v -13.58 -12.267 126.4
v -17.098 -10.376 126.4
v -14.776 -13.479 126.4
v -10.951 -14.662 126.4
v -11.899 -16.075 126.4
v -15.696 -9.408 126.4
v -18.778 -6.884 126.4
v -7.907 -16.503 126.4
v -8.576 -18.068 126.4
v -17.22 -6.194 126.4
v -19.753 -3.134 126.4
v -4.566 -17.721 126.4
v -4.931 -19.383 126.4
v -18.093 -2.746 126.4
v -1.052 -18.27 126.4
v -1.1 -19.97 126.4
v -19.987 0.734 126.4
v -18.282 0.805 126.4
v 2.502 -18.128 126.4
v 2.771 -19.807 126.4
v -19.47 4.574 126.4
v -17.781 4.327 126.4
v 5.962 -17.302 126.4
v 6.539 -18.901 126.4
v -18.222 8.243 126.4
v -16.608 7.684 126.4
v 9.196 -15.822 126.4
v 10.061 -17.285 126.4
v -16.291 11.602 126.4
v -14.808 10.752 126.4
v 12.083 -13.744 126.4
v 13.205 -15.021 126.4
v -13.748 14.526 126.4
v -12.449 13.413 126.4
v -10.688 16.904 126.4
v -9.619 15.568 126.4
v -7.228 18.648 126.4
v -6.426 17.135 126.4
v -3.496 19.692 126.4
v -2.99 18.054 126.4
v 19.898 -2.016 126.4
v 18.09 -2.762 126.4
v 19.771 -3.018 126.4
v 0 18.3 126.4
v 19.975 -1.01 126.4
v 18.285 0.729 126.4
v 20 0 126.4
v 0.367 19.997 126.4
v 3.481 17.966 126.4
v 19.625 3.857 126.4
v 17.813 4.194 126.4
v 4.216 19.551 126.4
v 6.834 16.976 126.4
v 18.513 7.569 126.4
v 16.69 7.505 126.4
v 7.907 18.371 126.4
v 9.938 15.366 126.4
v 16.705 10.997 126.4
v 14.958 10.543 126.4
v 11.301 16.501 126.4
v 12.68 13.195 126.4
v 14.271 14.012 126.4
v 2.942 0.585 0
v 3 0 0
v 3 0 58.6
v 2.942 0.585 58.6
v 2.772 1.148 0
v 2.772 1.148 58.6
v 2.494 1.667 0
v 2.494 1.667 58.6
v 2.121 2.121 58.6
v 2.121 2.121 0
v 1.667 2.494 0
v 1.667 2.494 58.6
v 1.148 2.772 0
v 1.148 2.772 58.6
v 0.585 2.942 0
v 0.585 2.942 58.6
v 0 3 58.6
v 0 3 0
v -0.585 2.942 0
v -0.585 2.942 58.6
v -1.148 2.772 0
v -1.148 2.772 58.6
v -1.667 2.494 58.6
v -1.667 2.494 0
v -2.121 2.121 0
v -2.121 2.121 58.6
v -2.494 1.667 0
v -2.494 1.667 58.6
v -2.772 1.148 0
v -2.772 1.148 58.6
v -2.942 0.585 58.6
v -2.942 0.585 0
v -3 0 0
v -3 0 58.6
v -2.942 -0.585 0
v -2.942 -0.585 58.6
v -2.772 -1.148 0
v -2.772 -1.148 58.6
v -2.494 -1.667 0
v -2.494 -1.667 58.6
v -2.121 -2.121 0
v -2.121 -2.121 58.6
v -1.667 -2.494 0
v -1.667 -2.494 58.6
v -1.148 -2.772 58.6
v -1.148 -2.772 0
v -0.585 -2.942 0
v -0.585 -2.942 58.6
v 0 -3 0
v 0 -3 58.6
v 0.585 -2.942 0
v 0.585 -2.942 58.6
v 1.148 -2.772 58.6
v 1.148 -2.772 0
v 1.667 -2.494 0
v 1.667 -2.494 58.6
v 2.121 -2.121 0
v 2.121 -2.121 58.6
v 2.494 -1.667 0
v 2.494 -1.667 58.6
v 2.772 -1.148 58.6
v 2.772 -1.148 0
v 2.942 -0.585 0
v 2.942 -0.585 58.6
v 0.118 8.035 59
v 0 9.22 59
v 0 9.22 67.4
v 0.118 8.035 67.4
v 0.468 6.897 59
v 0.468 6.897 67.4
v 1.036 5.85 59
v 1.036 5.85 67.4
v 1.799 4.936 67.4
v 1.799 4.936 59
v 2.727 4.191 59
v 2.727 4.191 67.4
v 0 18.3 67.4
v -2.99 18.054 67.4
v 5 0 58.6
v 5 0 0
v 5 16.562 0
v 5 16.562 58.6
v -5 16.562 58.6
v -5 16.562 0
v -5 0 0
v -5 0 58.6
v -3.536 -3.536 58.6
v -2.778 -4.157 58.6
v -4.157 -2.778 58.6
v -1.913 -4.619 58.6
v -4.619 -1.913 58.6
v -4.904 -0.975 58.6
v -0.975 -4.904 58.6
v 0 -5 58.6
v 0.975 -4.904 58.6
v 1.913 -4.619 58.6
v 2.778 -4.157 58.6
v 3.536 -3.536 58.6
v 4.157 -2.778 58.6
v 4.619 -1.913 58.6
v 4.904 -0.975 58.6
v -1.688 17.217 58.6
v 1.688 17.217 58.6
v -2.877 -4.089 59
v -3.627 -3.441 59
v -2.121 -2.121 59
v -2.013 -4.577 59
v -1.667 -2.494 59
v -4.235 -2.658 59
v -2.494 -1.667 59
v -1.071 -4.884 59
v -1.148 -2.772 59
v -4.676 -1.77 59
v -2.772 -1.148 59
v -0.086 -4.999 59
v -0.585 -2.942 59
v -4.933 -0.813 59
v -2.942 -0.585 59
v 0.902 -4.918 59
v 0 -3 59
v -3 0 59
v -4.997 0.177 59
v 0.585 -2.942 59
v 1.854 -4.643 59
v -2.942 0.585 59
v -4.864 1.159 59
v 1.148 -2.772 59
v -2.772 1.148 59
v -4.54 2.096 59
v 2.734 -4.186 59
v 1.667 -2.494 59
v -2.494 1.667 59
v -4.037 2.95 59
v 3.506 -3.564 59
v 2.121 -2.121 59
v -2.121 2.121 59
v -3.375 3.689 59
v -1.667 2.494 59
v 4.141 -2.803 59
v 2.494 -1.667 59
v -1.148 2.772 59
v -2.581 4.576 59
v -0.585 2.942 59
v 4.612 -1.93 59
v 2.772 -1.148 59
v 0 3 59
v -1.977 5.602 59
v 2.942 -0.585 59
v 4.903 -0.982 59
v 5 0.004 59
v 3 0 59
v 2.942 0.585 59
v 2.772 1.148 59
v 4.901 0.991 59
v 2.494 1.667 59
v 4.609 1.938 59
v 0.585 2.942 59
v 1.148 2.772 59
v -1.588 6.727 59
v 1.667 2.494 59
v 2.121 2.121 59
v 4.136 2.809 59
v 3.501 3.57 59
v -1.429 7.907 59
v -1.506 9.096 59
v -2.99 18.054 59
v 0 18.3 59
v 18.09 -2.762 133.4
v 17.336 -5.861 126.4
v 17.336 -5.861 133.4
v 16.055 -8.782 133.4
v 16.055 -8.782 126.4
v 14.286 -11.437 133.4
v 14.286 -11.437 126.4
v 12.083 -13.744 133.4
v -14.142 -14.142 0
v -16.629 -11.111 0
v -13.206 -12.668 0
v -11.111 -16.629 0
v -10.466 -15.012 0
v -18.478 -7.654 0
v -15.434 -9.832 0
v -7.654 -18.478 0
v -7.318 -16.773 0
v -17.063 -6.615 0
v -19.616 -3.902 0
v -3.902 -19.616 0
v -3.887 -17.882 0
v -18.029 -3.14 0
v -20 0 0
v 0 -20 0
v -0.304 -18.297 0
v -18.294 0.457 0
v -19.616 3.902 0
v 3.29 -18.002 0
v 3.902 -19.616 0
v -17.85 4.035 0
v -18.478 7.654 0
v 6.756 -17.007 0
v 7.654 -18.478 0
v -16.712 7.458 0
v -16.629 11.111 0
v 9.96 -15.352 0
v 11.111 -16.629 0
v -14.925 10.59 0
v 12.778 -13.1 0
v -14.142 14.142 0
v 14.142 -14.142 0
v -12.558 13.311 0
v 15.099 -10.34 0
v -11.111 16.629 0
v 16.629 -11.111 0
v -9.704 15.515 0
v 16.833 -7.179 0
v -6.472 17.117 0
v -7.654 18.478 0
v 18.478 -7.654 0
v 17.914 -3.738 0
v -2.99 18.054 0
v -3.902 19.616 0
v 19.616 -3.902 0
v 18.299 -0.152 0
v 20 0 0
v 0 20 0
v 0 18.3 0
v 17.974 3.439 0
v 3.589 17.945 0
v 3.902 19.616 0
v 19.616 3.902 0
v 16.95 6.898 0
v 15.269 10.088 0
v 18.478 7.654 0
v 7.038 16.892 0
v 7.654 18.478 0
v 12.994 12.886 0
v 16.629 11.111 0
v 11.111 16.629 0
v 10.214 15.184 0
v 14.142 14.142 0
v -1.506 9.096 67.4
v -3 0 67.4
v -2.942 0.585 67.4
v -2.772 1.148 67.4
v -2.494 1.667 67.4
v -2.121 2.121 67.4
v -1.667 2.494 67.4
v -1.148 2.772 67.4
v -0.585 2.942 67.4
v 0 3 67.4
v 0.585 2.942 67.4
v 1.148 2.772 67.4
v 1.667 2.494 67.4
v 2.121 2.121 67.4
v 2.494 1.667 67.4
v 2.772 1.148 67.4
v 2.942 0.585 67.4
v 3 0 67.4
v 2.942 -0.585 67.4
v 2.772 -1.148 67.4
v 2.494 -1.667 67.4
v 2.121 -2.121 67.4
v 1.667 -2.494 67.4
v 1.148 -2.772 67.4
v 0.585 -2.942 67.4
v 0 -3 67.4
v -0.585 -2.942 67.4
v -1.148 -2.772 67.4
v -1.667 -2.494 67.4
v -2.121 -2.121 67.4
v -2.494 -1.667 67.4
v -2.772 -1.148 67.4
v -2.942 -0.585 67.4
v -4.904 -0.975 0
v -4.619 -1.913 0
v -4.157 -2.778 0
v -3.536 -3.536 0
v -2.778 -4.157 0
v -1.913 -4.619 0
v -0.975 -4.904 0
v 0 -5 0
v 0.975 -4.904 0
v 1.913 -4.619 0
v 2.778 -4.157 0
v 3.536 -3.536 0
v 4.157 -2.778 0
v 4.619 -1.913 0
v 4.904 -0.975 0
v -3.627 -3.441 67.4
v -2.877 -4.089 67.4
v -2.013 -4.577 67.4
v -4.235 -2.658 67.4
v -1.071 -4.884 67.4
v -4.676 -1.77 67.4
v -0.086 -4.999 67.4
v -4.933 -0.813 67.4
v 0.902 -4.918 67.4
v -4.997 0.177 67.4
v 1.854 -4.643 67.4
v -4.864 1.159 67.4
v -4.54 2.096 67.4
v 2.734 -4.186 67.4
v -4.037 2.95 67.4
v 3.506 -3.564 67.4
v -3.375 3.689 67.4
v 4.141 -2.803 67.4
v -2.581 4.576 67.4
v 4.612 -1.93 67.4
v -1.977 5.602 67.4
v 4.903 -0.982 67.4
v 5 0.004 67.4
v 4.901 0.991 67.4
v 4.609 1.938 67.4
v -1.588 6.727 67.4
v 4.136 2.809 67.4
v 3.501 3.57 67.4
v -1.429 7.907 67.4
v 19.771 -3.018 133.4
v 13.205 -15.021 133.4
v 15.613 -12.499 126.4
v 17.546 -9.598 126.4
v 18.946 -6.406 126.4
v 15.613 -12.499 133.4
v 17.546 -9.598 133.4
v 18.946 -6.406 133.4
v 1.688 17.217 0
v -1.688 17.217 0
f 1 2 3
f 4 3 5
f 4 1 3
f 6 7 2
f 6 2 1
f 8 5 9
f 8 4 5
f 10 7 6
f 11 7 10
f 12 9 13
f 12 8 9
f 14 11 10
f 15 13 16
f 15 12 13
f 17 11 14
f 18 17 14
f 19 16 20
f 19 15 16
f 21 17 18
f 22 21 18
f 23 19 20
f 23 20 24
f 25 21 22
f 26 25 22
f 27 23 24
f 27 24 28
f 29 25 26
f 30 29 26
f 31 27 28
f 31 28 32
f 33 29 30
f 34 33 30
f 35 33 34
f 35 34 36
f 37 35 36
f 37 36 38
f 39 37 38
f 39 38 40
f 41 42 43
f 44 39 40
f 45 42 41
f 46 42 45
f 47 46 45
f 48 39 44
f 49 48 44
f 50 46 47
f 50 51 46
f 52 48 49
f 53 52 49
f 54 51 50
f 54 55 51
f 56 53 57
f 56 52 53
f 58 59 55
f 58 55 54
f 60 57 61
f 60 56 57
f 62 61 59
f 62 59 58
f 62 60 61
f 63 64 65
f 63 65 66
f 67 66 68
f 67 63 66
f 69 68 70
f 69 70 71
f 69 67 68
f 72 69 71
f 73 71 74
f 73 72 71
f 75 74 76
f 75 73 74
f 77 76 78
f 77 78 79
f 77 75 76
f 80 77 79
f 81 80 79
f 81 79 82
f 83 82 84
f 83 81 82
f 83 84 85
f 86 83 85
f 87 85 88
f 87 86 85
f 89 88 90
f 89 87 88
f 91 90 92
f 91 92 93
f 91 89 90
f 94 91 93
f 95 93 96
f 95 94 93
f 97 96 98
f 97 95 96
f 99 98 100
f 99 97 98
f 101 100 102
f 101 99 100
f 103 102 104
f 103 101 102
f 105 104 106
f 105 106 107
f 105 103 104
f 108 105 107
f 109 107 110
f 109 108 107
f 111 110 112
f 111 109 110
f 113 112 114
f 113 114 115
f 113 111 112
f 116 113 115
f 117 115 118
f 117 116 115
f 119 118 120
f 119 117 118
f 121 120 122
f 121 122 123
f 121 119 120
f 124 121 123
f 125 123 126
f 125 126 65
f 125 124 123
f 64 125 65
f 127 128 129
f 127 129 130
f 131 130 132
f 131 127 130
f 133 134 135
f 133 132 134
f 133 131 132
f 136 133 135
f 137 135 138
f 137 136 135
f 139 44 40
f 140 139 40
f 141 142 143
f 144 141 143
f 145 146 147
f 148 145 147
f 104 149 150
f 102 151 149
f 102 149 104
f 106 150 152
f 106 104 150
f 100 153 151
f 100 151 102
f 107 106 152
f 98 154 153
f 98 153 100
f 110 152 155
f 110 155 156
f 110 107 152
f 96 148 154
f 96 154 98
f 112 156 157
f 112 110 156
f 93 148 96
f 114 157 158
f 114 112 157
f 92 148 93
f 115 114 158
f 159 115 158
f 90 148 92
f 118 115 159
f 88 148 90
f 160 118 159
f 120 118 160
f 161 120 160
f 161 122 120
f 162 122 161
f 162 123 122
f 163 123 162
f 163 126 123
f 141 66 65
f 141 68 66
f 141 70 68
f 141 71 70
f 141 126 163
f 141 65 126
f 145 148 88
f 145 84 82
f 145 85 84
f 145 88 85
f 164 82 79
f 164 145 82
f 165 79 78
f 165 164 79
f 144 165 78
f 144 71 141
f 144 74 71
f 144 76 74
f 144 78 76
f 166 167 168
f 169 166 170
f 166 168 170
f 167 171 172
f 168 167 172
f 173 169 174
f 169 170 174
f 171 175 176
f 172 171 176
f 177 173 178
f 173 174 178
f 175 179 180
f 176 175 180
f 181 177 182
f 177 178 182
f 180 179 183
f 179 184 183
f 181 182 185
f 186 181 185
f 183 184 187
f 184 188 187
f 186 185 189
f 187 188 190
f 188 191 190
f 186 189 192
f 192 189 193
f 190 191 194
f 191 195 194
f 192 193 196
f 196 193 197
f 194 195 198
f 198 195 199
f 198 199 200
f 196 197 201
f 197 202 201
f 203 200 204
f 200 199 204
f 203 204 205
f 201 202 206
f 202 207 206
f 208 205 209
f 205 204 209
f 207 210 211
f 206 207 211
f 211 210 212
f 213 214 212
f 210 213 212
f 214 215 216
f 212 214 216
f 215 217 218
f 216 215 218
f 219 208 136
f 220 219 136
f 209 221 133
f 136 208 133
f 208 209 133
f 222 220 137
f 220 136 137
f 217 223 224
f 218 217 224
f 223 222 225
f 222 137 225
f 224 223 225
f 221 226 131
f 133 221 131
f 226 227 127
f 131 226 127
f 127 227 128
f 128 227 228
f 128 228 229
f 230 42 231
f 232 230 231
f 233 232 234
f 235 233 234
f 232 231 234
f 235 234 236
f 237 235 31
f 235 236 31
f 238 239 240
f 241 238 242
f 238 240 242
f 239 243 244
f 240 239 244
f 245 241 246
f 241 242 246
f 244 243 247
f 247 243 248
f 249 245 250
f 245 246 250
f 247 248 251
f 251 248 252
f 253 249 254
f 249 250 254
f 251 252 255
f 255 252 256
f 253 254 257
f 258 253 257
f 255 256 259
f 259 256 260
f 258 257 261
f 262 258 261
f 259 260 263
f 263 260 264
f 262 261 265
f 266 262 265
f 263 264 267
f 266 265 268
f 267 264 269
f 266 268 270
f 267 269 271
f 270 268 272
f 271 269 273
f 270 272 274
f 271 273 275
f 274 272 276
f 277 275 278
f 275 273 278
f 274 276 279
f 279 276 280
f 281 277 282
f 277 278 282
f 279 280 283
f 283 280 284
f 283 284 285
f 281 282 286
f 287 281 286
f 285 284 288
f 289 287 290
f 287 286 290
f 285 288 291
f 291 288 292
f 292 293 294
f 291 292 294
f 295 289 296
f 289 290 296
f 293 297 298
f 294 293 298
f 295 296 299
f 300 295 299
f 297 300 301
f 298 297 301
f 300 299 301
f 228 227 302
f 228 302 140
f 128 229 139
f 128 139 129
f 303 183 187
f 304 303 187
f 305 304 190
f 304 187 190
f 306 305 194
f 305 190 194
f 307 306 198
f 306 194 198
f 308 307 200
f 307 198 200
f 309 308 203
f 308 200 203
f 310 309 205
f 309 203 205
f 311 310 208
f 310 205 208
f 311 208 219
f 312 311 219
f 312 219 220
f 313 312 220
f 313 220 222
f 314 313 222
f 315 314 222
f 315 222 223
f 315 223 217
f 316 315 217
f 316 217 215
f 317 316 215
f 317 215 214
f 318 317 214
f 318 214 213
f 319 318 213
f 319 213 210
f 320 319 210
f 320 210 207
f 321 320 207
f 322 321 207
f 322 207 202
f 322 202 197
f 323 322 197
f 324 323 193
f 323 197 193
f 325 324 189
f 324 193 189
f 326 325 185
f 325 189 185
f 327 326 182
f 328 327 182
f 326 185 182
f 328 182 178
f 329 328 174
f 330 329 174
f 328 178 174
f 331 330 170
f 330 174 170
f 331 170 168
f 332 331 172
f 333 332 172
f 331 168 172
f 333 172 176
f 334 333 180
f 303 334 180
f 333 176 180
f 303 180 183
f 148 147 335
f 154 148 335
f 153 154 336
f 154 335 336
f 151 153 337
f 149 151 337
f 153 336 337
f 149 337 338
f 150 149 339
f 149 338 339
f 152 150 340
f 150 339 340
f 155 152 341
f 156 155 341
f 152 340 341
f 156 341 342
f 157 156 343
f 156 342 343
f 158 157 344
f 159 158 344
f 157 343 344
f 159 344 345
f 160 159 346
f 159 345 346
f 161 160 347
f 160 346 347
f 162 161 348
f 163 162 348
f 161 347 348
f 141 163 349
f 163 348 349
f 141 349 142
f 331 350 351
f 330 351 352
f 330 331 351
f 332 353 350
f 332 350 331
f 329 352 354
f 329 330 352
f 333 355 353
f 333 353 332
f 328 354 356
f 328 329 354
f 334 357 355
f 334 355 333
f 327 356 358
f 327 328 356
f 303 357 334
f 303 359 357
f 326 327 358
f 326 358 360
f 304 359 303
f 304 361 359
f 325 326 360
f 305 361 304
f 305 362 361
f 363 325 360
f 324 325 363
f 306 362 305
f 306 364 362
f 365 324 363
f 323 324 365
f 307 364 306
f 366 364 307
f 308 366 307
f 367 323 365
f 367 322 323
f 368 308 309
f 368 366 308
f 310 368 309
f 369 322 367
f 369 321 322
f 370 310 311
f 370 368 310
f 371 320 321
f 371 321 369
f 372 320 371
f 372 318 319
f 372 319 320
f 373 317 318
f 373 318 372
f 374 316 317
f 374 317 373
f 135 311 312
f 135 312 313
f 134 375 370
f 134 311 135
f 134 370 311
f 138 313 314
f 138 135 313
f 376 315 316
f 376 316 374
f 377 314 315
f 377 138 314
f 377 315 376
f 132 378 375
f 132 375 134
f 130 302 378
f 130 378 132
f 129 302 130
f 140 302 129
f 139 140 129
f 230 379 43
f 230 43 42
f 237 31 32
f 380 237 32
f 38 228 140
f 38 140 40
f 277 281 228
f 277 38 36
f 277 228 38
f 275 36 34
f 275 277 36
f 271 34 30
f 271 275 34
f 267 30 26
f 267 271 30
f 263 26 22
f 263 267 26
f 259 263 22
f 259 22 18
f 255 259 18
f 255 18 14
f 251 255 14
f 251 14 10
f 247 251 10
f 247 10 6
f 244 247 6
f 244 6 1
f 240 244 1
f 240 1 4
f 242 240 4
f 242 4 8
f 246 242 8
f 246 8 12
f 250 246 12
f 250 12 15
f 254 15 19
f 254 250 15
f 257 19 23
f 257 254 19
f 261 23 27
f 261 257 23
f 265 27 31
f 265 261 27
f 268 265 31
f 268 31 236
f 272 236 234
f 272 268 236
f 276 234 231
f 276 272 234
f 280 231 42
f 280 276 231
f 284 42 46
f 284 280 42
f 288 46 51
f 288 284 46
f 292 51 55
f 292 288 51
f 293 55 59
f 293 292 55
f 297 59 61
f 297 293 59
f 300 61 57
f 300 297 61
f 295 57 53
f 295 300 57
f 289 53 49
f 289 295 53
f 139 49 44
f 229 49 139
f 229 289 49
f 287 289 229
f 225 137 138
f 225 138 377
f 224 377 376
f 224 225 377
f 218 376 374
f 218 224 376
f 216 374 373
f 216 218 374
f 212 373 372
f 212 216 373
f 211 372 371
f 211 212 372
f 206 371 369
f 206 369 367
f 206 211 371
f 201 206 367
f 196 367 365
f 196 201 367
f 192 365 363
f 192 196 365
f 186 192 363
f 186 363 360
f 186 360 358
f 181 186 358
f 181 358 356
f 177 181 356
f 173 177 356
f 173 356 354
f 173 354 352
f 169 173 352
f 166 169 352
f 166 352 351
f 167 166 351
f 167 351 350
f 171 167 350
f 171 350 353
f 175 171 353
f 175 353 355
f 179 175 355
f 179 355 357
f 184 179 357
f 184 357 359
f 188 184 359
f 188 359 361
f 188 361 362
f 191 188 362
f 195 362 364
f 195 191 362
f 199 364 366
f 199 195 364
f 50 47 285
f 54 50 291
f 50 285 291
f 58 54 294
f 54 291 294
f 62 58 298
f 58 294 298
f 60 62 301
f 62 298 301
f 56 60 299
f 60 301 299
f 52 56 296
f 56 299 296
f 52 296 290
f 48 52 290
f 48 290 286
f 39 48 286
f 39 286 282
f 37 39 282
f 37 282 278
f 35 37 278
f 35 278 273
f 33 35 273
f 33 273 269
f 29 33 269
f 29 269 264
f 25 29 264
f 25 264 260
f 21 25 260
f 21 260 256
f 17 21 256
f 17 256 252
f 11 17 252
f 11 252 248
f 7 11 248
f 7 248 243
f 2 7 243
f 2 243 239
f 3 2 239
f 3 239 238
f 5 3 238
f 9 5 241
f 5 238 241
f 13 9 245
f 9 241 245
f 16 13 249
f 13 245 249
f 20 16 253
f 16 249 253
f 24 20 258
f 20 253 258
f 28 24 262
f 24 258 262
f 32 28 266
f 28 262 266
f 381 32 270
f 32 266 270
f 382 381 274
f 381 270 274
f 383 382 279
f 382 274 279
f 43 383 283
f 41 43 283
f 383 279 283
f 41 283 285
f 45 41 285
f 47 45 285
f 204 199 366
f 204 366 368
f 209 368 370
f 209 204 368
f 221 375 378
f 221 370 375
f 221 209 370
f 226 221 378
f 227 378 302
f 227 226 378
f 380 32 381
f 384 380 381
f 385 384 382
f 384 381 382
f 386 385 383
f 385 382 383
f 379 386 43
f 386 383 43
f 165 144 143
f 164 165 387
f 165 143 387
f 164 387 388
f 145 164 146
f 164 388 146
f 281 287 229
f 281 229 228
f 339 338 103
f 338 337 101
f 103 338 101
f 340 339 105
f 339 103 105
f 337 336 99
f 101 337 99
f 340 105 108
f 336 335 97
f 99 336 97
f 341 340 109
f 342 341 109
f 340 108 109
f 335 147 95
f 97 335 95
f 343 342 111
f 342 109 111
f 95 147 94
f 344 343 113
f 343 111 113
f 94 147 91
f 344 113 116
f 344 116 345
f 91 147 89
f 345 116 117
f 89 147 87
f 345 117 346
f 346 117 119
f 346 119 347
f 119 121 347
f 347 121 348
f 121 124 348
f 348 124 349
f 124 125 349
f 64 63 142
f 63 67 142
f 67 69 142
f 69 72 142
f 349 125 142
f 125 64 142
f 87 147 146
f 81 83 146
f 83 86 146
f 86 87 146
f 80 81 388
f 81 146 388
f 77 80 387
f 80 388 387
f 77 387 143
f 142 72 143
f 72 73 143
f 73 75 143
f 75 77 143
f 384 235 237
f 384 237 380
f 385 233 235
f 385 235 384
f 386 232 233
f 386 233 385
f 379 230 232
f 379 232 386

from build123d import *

# Parameters (mm, degrees)
SKETCH_2_R          = 20
SKETCH_2_R_2        = 18.3
EXTRUDE_1_DEPTH     = 126.4
SKETCH_5_R          = 3
EXTRUDE_3_DEPTH     = 126.4
CUT_EXTRUDE1_DEPTH  = 59
CUT_EXTRUDE2_DEPTH  = 59
BOSS_EXTRUDE4_DEPTH = 7
SKETCH3_R           = 3
BOSS_EXTRUDE6_DEPTH = 58.6


with BuildPart() as part:
    # Эскиз2 → Бобышка-Вытянуть1 (new body)
    with BuildSketch(Plane.XY):
        Circle(SKETCH_2_R)
        Circle(SKETCH_2_R_2, mode=Mode.SUBTRACT)
    extrude(amount=EXTRUDE_1_DEPTH)

    # Эскиз5 → Бобышка-Вытянуть3 (add, through all)
    with BuildSketch(Plane(origin=(0, 0, 0), x_dir=(-1, 0, 0), z_dir=(0, 0, -1))):
        with BuildLine():
            Line((0, 18.3), (0, 9.219544457))
            ThreePointArc((0, 9.219544457), (-0.725705562, 6.35915669), (-2.727272727, 4.190702026))
            ThreePointArc((-2.727272727, 4.190702026), (-0.409836066, -4.983175132), (3.375314281, 3.688801093))
            ThreePointArc((3.375314281, 3.688801093), (1.754930846, 6.155139323), (1.506314907, 9.095659151))
            Line((1.506314907, 9.095659151), (2.989905079, 18.054098361))
            ThreePointArc((2.989905079, 18.054098361), (1.5, 18.238420984), (0, 18.3))
        make_face()
        Circle(SKETCH_5_R, mode=Mode.SUBTRACT)
    extrude(amount=-EXTRUDE_3_DEPTH)

    # Sketch1 → Cut-Extrude1 (cut)
    with BuildSketch(Plane(origin=(0, 0, 0), x_dir=(-1, 0, 0), z_dir=(0, 0, -1))):
        with BuildLine():
            Line((0, 18.3), (2.989905079, 18.054098361))
            ThreePointArc((2.989905079, 18.054098361), (-1.5, -18.238420984), (0, 18.3))
        make_face()
    extrude(amount=-CUT_EXTRUDE1_DEPTH, mode=Mode.SUBTRACT)

    # Sketch2 → Cut-Extrude2 (cut)
    with BuildSketch(Plane.XY.offset(126.4)):
        with BuildLine():
            Line((0, 18.3), (-2.989905079, 18.054098361))
            ThreePointArc((-2.989905079, 18.054098361), (1.5, -18.238420984), (0, 18.3))
        make_face()
    extrude(amount=-CUT_EXTRUDE2_DEPTH, mode=Mode.SUBTRACT)

    # Sketch6 → Boss-Extrude4 (add)
    with BuildSketch(Plane.XY.offset(126.4)):
        with BuildLine():
            Line((19.770932531, -3.018315232), (18.090403266, -2.761758437))
            ThreePointArc((18.090403266, -2.761758437), (16.05484144, -8.782486342), (12.082828792, -13.743916778))
            Line((12.082828792, -13.743916778), (13.205277368, -15.020674074))
            ThreePointArc((13.205277368, -15.020674074), (17.546274798, -9.598345728), (19.770932531, -3.018315232))
        make_face()
    extrude(amount=BOSS_EXTRUDE4_DEPTH)


with BuildPart() as body_2:
    # Sketch3 → Boss-Extrude6 (new body)
    with BuildSketch(Plane.XY):
        with BuildLine():
            Line((5, 0), (5, 16.561702811))
            ThreePointArc((5, 16.561702811), (0, 17.3), (-5, 16.561702811))
            Line((-5, 16.561702811), (-5, 0))
            ThreePointArc((-5, 0), (0, -5), (5, 0))
        make_face()
        Circle(SKETCH3_R, mode=Mode.SUBTRACT)
    extrude(amount=BOSS_EXTRUDE6_DEPTH)


solid = Compound([part.part, body_2.part])
